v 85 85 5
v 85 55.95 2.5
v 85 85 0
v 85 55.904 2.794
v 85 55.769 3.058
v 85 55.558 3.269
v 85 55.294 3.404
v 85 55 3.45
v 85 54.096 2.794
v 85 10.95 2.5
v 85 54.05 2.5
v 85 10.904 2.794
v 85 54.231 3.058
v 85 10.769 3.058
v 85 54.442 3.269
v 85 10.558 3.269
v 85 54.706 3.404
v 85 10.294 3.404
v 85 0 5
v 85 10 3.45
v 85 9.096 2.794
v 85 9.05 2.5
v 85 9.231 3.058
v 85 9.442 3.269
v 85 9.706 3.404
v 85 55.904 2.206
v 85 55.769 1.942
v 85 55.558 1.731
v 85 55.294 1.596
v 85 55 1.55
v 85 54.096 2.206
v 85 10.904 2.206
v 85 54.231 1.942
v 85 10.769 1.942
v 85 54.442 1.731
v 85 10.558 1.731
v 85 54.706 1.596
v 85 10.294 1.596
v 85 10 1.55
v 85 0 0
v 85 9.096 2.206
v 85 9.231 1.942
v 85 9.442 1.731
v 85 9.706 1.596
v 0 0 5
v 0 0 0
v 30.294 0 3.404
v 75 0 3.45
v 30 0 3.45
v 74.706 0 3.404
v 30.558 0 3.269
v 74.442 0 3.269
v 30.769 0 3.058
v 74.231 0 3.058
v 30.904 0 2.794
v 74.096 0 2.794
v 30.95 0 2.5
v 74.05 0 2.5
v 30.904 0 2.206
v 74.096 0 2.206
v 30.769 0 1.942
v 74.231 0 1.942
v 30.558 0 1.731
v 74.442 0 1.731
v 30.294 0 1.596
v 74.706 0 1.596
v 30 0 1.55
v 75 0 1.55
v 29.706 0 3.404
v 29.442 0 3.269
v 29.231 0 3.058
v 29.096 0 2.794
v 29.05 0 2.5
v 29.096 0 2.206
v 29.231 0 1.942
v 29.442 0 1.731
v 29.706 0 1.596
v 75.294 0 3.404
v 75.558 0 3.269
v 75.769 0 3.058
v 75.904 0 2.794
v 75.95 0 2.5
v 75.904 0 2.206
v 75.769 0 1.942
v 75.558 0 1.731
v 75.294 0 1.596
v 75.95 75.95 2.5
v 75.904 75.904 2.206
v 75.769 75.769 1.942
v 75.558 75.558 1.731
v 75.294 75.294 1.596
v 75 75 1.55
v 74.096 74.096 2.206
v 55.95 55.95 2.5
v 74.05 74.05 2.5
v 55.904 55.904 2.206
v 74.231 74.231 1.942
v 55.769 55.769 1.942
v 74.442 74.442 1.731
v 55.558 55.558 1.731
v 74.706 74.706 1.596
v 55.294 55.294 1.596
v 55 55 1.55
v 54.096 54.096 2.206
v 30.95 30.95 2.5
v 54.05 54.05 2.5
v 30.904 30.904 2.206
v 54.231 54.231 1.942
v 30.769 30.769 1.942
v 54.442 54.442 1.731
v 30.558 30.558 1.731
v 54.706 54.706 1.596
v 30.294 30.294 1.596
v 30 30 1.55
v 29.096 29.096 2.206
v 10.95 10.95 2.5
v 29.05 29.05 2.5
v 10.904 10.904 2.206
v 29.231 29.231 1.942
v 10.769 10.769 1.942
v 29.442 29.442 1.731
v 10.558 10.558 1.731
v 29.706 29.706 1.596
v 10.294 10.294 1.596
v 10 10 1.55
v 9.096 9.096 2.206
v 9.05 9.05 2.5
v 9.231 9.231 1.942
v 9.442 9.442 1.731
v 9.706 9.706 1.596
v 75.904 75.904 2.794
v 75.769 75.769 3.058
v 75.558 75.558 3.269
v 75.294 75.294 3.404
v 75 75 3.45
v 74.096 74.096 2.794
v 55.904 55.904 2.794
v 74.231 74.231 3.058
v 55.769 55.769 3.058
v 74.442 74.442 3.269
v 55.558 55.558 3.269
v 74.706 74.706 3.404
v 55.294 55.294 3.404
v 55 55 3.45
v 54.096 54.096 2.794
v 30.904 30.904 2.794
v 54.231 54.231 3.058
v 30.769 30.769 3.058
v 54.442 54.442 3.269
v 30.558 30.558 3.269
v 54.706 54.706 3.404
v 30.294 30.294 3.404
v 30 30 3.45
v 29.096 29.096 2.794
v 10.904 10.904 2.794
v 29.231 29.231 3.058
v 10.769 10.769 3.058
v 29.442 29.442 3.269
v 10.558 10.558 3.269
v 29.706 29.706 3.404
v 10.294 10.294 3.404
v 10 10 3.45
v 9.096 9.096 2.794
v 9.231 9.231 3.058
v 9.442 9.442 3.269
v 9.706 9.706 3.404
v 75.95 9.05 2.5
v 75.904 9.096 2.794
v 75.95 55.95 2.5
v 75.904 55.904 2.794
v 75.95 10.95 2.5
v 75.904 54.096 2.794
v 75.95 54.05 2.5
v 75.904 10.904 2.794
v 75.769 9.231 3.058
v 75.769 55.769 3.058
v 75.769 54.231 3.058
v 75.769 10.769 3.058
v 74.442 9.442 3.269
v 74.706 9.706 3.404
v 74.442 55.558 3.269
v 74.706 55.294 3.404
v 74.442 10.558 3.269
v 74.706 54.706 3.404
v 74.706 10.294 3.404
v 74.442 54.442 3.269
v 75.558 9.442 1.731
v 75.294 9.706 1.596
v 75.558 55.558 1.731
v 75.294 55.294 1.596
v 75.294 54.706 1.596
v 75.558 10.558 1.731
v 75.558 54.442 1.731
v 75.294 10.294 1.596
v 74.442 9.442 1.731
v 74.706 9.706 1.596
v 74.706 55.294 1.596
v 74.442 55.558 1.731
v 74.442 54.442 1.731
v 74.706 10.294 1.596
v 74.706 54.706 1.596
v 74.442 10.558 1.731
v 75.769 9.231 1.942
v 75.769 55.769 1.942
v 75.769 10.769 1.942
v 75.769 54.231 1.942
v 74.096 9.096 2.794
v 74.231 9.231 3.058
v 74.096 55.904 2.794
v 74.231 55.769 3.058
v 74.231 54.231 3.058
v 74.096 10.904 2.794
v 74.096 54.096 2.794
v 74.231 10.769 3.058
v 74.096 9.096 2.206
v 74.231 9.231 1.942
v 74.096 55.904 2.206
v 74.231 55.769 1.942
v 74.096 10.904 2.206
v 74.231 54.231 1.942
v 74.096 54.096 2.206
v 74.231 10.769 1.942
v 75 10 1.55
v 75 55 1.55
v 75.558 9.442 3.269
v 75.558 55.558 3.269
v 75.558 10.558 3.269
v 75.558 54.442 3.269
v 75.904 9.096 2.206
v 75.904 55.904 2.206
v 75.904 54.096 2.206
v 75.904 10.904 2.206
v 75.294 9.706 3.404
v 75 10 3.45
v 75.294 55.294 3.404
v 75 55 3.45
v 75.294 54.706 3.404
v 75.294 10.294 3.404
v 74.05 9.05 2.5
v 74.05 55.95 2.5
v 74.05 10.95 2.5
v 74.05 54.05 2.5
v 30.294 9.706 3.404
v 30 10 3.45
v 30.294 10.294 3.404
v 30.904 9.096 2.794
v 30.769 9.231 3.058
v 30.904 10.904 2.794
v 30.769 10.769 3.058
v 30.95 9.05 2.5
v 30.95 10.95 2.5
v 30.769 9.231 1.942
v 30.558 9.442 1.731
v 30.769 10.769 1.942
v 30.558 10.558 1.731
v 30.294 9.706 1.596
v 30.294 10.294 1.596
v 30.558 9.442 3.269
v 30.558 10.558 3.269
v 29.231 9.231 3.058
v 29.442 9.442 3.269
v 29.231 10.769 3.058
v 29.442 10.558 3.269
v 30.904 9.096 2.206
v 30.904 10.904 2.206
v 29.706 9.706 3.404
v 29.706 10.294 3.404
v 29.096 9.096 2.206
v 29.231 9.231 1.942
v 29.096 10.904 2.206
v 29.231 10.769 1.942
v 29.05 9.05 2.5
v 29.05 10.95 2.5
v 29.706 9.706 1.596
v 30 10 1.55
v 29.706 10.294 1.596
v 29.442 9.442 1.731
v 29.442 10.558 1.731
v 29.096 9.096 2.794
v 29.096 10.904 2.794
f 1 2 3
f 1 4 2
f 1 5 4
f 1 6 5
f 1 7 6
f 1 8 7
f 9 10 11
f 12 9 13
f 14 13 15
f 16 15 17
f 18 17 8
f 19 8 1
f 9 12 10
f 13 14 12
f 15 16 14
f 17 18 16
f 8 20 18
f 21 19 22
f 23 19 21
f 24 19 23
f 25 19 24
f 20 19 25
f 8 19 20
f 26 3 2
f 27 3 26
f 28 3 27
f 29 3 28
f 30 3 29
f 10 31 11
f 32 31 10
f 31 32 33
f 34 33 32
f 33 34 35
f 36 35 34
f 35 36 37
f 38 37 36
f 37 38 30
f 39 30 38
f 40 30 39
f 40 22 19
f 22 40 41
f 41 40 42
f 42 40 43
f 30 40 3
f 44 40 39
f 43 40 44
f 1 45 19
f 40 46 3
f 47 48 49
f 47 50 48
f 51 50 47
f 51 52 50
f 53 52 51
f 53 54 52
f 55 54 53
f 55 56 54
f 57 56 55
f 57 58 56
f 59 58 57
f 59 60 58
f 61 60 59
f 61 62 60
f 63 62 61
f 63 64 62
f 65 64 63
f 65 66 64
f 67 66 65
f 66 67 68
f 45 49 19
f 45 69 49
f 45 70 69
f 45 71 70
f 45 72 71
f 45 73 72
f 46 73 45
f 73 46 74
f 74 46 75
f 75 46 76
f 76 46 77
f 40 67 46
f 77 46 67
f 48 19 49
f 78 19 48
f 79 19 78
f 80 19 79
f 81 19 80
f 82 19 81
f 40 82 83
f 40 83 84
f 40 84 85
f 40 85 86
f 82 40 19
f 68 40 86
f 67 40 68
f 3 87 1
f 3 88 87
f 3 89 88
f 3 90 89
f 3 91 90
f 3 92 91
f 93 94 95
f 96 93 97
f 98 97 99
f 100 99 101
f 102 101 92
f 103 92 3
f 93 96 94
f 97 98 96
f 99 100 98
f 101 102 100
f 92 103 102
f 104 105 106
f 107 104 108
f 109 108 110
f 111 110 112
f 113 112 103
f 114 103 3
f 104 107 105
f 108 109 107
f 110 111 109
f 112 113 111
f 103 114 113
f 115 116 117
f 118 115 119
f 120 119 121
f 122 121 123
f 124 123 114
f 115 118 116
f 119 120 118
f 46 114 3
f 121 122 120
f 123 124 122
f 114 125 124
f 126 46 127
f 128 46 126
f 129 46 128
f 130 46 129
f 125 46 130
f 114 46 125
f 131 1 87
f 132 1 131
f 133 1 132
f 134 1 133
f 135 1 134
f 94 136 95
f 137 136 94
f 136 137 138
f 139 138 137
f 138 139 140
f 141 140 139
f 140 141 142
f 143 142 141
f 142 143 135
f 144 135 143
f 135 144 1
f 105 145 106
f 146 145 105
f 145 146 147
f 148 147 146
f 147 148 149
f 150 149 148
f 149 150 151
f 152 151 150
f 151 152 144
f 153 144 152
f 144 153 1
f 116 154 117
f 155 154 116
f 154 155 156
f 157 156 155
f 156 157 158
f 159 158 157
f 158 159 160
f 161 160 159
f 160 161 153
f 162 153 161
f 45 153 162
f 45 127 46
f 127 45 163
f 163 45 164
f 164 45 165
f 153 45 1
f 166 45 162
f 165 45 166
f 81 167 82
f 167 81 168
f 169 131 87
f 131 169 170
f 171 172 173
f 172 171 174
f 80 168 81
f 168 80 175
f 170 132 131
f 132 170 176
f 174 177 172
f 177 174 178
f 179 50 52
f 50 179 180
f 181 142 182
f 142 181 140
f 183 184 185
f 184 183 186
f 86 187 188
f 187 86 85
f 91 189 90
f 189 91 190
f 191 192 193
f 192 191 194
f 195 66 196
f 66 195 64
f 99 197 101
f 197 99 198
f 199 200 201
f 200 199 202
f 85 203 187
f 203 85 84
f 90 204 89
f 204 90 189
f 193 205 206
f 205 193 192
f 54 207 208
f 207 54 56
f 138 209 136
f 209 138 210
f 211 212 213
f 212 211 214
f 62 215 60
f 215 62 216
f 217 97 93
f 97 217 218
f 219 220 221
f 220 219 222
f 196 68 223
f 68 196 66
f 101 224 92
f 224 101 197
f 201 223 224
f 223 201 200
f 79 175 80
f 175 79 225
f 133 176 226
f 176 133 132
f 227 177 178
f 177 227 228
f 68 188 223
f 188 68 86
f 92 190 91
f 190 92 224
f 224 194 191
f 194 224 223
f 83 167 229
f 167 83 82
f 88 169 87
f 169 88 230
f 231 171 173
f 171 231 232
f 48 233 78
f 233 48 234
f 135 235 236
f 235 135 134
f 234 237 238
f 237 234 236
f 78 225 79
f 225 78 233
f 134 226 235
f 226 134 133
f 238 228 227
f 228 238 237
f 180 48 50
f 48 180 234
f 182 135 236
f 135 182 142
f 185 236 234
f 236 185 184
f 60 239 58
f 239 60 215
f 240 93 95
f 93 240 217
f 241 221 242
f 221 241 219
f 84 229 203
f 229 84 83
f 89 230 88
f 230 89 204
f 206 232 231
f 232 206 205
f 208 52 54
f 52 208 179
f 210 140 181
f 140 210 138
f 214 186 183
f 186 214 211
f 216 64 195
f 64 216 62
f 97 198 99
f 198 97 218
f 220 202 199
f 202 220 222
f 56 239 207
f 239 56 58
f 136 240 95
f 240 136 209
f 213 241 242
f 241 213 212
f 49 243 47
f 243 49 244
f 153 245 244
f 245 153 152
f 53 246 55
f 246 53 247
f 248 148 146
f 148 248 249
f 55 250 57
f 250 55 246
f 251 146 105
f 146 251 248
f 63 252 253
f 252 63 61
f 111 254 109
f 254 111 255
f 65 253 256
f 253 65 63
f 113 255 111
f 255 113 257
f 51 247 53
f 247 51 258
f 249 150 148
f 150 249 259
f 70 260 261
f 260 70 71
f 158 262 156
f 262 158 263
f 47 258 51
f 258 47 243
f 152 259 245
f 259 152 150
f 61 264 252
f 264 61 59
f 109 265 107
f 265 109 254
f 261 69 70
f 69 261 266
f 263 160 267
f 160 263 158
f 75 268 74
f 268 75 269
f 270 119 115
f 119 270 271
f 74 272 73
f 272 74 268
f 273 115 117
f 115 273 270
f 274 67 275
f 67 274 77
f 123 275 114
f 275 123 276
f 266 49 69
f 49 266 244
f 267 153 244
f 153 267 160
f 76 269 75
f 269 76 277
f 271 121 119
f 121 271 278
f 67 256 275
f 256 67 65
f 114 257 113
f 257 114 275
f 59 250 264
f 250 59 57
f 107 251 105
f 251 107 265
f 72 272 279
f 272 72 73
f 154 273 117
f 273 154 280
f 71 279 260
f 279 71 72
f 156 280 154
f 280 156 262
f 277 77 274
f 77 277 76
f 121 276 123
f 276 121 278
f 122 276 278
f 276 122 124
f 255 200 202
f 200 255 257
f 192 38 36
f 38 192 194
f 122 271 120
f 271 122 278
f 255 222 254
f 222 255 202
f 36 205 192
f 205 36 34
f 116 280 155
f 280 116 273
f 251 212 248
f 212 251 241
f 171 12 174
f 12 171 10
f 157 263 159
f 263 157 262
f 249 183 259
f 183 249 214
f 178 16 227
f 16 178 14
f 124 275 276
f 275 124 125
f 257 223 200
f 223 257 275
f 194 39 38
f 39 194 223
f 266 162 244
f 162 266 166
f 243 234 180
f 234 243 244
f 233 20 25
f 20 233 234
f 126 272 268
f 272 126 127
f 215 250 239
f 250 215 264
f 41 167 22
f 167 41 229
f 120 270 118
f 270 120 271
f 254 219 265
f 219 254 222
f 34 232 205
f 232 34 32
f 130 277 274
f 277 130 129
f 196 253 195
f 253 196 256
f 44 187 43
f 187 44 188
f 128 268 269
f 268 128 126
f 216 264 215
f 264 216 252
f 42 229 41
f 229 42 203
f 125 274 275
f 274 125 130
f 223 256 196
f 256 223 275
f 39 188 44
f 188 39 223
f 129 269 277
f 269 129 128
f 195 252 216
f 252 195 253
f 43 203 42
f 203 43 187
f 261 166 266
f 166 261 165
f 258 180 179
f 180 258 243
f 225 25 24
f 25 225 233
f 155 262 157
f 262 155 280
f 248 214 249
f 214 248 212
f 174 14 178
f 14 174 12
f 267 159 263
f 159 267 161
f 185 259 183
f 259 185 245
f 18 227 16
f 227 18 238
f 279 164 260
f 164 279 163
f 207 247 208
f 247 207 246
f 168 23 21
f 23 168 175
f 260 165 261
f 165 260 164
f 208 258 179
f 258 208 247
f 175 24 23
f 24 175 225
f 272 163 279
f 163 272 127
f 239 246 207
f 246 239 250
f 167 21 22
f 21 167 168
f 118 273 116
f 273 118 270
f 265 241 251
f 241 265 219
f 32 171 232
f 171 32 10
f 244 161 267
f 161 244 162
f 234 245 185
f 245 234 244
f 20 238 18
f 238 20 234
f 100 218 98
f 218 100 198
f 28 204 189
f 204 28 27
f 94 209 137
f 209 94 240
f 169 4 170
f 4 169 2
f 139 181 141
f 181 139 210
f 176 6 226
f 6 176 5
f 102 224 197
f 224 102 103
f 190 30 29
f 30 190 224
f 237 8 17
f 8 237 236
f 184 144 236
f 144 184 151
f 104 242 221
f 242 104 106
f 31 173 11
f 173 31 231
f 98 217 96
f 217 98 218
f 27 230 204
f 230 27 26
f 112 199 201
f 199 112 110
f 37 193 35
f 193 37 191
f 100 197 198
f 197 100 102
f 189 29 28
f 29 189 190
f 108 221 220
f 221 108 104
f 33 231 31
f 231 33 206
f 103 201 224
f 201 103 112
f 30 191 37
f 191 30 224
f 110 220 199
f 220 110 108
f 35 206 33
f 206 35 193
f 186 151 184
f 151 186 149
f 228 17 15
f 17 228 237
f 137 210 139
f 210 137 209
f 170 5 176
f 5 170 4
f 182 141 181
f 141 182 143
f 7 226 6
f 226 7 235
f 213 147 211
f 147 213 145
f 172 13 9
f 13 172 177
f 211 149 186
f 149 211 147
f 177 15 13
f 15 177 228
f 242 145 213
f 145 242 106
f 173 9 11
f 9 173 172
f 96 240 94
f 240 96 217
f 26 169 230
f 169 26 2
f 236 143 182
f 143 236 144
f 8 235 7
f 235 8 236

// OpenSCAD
W = 85;

T = 5;
screw_r = 1.9/2;

difference(){
  cube([W, W, T]);
  rotate(a=45, v=[0, 0, 1])translate([-W, 0, -T])cube([3*W, 3*W, 3*T]);
  translate([W - 10, 80, T/2])rotate(a=90, v=[1, 0, 0])cylinder(r=screw_r, h=100, $fn=20);
  translate([W - 55, 80, T/2])rotate(a=90, v=[1, 0, 0])cylinder(r=screw_r, h=100, $fn=20);
  translate([0, 10, T/2])rotate(a=90, v=[0, 1, 0])cylinder(r=screw_r, h=100, $fn=20);
  translate([0, 55, T/2])rotate(a=90, v=[0, 1, 0])cylinder(r=screw_r, h=100, $fn=20);
}
